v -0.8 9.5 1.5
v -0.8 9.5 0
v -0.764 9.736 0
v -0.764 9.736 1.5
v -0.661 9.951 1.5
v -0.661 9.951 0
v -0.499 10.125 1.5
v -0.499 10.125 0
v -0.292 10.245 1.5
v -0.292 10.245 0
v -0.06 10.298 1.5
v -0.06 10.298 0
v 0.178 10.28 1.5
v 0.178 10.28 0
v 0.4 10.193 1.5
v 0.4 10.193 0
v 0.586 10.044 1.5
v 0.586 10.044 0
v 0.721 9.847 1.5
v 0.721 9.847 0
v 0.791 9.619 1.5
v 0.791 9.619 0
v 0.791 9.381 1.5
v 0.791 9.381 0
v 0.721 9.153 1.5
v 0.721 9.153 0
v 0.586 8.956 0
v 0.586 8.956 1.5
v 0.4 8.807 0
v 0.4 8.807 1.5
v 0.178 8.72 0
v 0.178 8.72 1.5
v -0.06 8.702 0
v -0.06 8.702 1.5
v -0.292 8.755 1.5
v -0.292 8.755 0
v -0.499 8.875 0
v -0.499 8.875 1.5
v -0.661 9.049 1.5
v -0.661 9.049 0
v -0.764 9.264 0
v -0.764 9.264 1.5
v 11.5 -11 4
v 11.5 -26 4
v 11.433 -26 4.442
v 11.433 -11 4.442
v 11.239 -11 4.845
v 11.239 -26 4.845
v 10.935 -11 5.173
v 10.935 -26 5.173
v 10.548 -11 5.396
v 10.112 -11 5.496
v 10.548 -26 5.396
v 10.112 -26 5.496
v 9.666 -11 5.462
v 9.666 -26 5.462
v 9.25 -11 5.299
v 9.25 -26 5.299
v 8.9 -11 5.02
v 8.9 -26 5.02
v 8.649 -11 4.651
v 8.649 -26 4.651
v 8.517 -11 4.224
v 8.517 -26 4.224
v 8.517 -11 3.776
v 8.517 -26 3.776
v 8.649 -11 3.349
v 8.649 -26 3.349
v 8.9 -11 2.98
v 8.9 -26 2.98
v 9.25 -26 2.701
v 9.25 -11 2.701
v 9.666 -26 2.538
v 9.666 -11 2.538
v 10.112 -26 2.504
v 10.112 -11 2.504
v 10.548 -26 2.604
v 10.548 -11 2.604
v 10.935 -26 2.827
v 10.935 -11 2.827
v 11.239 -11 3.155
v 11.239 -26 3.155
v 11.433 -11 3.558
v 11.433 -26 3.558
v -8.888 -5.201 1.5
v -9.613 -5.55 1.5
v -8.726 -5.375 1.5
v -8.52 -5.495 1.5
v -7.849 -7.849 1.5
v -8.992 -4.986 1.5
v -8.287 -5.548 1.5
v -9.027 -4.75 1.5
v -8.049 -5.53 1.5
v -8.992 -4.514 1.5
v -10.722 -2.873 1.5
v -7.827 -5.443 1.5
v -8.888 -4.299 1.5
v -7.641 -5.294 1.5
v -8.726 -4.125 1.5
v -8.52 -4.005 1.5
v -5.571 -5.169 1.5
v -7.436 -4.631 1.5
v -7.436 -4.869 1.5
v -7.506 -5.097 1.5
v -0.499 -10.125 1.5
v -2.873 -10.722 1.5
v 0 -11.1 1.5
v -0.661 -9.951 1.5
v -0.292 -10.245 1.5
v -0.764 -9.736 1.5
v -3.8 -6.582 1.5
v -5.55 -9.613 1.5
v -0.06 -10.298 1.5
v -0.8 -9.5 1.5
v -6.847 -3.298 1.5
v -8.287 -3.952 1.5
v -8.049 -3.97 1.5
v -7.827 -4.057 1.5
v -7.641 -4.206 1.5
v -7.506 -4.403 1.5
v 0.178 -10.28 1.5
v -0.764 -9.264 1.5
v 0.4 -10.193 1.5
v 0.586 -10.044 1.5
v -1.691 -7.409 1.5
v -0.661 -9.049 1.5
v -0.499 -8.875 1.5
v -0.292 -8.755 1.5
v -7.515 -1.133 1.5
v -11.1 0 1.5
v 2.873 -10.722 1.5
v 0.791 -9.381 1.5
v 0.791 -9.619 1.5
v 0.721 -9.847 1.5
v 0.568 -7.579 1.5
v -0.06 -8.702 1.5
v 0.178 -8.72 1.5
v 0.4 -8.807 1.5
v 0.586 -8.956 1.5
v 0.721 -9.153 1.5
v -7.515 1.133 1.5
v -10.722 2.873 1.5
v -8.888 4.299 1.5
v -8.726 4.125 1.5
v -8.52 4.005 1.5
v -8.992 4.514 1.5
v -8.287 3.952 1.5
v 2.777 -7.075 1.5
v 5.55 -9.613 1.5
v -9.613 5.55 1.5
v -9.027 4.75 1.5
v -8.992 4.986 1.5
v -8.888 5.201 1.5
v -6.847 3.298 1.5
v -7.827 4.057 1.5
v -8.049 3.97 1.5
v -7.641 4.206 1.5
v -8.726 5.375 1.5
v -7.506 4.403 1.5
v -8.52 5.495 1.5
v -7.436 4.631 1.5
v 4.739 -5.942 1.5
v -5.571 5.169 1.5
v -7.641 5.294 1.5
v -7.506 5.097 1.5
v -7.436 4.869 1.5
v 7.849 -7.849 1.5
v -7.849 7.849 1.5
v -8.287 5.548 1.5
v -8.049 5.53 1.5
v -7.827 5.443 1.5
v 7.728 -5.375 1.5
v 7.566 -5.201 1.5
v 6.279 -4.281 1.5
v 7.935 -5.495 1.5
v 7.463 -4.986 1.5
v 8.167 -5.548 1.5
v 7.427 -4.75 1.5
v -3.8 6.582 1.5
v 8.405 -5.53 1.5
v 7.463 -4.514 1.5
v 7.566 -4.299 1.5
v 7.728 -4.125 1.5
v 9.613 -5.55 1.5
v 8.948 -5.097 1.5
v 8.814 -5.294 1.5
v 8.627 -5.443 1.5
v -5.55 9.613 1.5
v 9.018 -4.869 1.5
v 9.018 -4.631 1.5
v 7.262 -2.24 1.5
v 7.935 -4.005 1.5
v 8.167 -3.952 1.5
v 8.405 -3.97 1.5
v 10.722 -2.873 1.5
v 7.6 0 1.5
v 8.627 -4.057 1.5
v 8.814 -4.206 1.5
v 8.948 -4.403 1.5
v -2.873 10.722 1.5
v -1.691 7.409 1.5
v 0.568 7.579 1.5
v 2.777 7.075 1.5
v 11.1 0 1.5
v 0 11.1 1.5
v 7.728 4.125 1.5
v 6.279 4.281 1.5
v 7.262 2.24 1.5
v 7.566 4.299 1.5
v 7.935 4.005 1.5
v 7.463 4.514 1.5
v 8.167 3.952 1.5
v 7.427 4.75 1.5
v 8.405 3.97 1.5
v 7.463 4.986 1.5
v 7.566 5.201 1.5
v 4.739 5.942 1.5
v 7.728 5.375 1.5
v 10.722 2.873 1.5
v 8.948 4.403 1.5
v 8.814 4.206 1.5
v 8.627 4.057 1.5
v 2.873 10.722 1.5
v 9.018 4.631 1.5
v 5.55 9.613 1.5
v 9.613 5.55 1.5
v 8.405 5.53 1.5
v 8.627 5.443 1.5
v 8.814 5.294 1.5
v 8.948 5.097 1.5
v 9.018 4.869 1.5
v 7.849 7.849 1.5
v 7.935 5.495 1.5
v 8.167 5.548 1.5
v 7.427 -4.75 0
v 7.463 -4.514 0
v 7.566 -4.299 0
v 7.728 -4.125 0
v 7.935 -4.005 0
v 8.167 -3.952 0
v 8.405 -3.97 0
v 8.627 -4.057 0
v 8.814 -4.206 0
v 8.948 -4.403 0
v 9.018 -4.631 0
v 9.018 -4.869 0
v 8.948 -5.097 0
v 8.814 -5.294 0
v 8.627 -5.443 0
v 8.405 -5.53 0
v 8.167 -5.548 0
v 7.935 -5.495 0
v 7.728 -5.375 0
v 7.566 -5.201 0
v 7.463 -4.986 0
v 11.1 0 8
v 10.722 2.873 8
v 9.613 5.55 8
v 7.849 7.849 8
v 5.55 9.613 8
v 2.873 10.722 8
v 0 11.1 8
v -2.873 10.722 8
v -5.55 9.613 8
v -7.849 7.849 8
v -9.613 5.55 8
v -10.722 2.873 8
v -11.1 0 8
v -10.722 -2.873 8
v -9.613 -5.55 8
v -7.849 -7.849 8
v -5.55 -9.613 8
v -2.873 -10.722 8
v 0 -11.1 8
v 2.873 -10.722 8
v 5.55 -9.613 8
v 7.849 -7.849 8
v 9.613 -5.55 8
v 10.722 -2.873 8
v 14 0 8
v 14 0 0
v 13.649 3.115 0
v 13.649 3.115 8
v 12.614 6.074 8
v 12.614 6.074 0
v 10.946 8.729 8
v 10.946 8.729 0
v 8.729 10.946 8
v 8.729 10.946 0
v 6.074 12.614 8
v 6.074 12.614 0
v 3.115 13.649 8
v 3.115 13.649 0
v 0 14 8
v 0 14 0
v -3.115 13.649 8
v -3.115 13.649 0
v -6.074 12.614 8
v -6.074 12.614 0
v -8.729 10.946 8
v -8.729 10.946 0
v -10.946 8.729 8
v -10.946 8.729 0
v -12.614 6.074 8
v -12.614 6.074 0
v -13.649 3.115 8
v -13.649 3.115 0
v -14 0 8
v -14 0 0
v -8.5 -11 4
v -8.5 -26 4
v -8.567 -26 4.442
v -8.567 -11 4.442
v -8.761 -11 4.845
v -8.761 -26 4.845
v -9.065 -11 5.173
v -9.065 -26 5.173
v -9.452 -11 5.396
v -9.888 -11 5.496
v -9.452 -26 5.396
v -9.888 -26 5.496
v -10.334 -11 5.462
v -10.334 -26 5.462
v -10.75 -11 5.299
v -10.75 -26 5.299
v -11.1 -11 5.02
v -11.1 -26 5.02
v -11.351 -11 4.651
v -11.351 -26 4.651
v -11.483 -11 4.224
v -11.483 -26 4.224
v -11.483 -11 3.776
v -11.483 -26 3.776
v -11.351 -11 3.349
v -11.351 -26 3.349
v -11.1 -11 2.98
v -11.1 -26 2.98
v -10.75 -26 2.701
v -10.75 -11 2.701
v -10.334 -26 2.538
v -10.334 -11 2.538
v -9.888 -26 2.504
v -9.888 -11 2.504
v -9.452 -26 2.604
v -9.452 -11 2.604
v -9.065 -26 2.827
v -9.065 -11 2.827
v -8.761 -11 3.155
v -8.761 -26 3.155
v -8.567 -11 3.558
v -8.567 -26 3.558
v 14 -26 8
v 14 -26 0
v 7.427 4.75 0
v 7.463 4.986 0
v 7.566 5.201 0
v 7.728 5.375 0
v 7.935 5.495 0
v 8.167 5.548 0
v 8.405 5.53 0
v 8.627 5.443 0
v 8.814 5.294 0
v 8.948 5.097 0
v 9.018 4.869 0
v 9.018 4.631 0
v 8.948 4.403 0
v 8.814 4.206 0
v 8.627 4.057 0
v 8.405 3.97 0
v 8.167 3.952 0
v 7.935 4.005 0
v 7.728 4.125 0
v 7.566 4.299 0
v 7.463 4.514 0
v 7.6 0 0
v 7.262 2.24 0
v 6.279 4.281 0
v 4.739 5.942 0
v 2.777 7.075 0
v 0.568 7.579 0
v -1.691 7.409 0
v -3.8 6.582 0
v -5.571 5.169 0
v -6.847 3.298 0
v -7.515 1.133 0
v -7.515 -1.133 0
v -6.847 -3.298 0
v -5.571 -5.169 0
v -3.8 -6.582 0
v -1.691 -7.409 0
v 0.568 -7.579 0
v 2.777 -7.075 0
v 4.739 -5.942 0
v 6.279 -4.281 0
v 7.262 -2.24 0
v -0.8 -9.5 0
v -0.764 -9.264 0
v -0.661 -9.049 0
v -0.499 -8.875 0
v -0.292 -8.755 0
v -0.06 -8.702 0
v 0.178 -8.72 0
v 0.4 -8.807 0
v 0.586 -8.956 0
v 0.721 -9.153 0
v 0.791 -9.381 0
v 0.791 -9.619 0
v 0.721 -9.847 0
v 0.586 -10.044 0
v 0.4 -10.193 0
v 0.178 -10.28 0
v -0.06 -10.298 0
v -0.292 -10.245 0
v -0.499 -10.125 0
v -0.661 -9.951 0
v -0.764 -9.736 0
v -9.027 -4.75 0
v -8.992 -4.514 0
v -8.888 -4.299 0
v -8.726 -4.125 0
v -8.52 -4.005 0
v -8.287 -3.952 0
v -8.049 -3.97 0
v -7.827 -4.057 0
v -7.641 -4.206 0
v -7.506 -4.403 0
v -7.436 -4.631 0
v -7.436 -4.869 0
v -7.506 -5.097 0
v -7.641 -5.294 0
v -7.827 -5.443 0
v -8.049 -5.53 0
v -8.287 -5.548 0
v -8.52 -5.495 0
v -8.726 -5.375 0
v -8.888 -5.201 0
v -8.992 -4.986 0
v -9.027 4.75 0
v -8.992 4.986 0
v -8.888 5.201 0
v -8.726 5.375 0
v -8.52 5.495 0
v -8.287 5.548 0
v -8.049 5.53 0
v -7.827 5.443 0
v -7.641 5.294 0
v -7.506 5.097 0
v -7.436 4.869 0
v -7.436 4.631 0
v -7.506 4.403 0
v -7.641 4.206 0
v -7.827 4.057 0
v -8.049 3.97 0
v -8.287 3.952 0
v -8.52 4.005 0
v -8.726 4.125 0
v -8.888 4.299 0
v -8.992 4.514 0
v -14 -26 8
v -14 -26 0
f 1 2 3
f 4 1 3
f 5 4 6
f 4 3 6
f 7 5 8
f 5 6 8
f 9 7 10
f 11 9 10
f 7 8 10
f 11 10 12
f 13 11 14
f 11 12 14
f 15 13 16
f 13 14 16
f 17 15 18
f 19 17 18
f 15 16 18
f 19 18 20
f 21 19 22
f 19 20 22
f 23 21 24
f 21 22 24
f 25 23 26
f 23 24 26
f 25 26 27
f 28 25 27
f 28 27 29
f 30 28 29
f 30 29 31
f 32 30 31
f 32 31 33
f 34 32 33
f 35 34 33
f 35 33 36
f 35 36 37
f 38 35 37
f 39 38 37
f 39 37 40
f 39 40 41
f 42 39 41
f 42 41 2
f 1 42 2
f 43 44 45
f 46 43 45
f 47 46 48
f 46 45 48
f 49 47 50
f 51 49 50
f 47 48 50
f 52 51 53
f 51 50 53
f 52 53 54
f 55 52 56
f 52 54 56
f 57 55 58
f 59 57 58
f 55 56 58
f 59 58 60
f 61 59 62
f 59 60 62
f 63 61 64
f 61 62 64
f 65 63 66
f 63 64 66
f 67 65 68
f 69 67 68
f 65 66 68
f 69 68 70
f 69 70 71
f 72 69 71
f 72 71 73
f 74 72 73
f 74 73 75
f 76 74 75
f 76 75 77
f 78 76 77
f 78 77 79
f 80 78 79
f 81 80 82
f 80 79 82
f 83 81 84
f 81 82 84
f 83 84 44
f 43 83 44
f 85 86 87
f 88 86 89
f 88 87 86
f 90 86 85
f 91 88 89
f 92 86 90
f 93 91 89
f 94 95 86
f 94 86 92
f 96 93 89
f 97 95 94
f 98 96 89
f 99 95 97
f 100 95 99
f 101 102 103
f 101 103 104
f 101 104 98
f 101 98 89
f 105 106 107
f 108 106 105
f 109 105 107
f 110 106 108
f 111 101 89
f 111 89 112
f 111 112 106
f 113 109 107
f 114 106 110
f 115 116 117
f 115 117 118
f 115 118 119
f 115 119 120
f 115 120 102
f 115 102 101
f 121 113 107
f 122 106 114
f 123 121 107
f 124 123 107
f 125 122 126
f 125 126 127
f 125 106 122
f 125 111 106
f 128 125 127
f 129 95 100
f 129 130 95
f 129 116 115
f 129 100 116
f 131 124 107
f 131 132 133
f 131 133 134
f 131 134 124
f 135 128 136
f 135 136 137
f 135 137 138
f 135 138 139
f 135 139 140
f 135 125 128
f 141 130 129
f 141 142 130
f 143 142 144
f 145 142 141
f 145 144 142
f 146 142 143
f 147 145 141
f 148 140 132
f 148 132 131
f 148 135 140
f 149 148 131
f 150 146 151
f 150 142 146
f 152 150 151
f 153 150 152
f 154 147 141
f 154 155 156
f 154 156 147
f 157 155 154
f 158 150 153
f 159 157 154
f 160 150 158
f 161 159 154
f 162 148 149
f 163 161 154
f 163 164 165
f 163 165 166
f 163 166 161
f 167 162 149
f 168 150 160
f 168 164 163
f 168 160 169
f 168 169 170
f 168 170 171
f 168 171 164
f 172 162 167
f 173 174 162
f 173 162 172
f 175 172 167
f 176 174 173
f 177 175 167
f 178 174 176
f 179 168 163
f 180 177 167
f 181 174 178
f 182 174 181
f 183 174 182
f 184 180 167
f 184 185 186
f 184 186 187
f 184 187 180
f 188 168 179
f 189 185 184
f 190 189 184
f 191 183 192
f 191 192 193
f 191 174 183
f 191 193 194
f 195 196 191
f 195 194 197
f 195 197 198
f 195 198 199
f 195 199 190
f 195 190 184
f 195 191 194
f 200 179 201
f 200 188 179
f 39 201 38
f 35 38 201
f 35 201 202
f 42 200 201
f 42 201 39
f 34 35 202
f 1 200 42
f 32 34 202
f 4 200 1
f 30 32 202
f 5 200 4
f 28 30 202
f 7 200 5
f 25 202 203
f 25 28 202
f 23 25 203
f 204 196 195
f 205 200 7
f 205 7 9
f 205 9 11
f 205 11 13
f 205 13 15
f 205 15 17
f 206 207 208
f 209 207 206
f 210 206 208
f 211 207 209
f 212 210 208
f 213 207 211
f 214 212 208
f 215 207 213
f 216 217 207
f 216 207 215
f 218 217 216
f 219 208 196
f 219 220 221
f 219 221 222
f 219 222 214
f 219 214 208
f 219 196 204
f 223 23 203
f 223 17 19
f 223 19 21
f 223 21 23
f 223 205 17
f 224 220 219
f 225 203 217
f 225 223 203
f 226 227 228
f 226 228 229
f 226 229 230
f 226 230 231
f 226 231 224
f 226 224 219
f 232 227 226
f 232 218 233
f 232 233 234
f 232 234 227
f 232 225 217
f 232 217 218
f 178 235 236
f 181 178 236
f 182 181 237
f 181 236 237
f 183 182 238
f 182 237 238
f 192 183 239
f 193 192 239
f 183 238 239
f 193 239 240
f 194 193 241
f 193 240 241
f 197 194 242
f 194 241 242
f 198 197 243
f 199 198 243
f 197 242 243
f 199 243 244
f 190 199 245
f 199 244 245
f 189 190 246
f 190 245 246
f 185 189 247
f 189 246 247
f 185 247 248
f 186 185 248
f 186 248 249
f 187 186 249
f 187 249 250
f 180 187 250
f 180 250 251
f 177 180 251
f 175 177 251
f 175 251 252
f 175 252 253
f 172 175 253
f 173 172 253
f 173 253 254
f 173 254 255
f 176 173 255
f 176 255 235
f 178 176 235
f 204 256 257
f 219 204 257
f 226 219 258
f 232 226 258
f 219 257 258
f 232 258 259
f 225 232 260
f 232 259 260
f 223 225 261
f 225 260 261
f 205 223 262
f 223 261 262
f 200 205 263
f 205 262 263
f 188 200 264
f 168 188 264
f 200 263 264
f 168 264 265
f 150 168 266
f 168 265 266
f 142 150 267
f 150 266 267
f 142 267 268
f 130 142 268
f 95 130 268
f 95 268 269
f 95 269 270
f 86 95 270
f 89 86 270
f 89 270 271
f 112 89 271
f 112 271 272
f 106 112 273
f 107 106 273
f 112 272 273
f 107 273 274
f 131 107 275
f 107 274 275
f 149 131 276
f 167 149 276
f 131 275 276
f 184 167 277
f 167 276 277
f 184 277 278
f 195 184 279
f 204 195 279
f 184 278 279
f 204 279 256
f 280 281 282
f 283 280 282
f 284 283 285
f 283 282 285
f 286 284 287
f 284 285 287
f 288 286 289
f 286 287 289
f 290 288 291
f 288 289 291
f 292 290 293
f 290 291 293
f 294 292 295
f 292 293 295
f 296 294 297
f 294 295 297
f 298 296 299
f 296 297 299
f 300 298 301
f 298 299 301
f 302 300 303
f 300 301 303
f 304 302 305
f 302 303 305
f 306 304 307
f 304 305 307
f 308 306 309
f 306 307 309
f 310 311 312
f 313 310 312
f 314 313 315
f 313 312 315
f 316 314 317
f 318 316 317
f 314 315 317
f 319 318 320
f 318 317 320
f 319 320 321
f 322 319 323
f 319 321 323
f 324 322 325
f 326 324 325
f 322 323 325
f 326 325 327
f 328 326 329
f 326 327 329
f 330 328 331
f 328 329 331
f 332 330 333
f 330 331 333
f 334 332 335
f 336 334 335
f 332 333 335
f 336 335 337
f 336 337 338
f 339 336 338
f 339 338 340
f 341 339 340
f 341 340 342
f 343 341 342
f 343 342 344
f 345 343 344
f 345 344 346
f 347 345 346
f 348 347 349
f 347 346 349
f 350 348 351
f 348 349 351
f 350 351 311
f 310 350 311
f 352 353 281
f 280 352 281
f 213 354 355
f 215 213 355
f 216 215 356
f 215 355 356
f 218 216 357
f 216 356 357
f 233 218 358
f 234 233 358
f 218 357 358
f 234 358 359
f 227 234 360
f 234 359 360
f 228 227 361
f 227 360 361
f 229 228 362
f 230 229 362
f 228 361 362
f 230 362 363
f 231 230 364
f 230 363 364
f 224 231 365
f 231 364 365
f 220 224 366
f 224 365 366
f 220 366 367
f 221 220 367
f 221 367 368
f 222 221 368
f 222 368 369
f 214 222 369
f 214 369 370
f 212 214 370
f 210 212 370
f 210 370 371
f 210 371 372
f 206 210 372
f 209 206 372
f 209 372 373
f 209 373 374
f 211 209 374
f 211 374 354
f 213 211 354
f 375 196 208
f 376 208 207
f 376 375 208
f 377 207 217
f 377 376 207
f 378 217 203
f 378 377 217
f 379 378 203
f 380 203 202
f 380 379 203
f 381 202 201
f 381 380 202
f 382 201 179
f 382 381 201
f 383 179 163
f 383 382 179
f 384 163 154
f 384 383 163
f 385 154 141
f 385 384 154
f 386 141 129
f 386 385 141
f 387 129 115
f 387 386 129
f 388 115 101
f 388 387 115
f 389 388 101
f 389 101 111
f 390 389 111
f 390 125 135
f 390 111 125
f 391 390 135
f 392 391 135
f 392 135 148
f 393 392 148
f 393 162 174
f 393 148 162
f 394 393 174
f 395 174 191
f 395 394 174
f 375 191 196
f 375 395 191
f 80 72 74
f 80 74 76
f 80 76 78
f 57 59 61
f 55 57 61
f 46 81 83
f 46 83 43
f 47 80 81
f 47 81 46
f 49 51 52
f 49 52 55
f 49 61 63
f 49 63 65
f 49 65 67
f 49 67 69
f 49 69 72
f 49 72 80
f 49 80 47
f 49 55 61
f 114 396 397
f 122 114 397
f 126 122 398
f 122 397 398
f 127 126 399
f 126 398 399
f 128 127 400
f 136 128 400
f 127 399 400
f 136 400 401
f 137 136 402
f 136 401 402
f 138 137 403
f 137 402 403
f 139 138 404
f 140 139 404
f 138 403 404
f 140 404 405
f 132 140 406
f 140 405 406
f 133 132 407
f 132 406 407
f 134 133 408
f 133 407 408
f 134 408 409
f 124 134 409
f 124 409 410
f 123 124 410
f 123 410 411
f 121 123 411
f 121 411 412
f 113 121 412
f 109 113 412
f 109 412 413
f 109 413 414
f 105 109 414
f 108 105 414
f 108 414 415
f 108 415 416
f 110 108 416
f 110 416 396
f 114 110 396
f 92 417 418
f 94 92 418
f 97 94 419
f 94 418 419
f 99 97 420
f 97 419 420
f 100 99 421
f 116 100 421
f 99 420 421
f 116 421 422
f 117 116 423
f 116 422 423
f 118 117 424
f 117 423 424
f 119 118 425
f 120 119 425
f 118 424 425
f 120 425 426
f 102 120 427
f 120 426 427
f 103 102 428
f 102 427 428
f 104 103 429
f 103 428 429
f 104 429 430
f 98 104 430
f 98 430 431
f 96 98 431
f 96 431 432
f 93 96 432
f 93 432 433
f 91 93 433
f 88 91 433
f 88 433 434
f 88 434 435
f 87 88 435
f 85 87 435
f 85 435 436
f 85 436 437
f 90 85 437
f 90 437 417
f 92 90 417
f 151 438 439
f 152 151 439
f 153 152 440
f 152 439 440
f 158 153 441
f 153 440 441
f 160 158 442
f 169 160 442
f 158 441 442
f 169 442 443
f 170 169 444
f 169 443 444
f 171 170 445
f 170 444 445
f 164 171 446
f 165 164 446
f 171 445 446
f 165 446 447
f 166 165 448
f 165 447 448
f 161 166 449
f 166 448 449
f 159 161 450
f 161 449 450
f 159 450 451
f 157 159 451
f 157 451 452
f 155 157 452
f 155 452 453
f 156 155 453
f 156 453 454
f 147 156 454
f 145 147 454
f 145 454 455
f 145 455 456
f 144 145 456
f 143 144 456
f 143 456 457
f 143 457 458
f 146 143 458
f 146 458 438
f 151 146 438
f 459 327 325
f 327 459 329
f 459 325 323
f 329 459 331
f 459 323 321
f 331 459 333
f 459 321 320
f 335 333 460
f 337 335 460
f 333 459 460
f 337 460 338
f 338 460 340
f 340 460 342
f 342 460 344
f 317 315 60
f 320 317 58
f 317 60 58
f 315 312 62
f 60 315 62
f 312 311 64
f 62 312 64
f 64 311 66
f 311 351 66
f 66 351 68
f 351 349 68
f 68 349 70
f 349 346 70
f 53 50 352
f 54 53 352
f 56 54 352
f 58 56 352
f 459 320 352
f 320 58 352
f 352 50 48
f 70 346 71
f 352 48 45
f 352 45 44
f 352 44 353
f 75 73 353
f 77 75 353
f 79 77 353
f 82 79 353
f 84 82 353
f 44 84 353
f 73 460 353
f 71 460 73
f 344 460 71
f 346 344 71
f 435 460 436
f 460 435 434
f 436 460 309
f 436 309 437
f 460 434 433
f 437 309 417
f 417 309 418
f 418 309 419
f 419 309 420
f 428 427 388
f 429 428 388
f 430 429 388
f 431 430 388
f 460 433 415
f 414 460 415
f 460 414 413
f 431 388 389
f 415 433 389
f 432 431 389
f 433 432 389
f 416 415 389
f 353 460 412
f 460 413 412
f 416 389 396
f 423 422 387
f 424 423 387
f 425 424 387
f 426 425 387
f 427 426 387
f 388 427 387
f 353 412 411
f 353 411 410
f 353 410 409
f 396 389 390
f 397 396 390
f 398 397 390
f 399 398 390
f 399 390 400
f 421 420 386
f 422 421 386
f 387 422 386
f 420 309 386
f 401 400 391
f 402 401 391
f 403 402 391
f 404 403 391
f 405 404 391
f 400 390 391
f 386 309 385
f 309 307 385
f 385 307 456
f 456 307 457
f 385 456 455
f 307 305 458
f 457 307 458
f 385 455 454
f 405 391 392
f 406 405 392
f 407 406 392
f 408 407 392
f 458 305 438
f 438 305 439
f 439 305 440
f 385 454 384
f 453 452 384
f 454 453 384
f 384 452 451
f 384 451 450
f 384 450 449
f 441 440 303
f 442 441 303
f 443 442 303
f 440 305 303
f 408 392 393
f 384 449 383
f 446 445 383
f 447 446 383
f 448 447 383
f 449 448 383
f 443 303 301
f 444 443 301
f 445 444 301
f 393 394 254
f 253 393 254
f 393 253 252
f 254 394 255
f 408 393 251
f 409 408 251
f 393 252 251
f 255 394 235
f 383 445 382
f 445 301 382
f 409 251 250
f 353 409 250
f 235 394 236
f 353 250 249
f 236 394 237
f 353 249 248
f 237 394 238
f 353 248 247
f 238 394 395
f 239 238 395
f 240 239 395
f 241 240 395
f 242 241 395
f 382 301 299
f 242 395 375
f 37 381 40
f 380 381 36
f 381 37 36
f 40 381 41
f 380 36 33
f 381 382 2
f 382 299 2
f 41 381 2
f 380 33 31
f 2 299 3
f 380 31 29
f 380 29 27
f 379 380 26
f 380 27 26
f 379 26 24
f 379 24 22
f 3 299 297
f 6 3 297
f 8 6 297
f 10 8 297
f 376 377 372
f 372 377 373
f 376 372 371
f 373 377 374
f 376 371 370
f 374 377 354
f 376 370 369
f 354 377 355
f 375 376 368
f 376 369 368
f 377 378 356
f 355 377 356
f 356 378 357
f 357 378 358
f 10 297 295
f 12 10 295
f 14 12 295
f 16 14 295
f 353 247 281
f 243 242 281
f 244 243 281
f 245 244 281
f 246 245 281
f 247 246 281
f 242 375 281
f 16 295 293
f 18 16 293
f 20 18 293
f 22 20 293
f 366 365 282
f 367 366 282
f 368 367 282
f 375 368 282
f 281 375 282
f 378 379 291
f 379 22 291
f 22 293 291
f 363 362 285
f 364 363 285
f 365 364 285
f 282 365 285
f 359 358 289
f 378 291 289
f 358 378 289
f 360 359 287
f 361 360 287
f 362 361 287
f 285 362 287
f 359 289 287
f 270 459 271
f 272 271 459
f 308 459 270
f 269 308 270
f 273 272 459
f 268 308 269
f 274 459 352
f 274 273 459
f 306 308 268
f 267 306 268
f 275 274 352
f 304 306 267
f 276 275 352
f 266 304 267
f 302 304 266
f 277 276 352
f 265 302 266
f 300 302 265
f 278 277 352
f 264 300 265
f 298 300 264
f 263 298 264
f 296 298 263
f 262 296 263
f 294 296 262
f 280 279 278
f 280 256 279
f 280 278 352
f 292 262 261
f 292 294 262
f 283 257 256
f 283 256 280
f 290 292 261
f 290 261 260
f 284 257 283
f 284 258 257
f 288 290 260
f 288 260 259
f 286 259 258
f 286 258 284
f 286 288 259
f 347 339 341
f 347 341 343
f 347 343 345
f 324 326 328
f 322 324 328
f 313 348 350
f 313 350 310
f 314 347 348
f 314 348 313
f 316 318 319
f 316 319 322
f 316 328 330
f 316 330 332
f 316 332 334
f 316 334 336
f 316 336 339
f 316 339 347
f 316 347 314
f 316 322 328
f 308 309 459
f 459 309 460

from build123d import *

# Parameters (mm, degrees)
ESQUISSE1_R             = 7.6
BOSS_EXTRU_1_DEPTH      = 8
ESQUISSE2_R             = 11.1
ENL_V_MAT_EXTRU_1_DEPTH = 6.5
ENL_V_MAT_EXTRU_2_REACH = 10
ESQUISSE3_R             = 0.8
ESQUISSE4_R             = 1.5
ENL_V_MAT_EXTRU_3_DEPTH = 15


with BuildPart() as part:
    # Esquisse1 → Boss.-Extru.1 (new body)
    with BuildSketch(Plane.XY):
        with BuildLine():
            Line((-14, 0), (-14, -26))
            Line((-14, -26), (14, -26))
            Line((14, -26), (14, 0))
            ThreePointArc((14, 0), (0, 14), (-14, 0))
        make_face()
        Circle(ESQUISSE1_R, mode=Mode.SUBTRACT)
    extrude(amount=BOSS_EXTRU_1_DEPTH)

    # Esquisse2 → Enlèv. mat.-Extru.1 (cut)
    with BuildSketch(Plane.XY.offset(8)):
        Circle(ESQUISSE2_R)
    extrude(amount=-ENL_V_MAT_EXTRU_1_DEPTH, mode=Mode.SUBTRACT)

    # Esquisse3 → Enlèv. mat.-Extru.2 (cut, up to next)
    with BuildSketch(Plane(origin=(0, 0, 0), x_dir=(-1, 0, 0), z_dir=(0, 0, -1)), mode=Mode.PRIVATE) as enl_v_mat_extru_2_sk1:
        with Locations((0, 9.5)):
            Circle(ESQUISSE3_R)
    enl_v_mat_extru_2_tool1 = extrude(enl_v_mat_extru_2_sk1.sketch, amount=-ENL_V_MAT_EXTRU_2_REACH, mode=Mode.PRIVATE) & part.part
    add(enl_v_mat_extru_2_tool1.solids().sort_by_distance((0, 9.5, 0))[0], mode=Mode.SUBTRACT)
    # Esquisse3 → Enlèv. mat.-Extru.2 (cut, up to next)
    with BuildSketch(Plane(origin=(0, 0, 0), x_dir=(-1, 0, 0), z_dir=(0, 0, -1)), mode=Mode.PRIVATE) as enl_v_mat_extru_2_sk2:
        with Locations((8.227241336, 4.75)):
            Circle(ESQUISSE3_R)
    enl_v_mat_extru_2_tool2 = extrude(enl_v_mat_extru_2_sk2.sketch, amount=-ENL_V_MAT_EXTRU_2_REACH, mode=Mode.PRIVATE) & part.part
    add(enl_v_mat_extru_2_tool2.solids().sort_by_distance((-8.227241, 4.75, 0))[0], mode=Mode.SUBTRACT)
    # Esquisse3 → Enlèv. mat.-Extru.2 (cut, up to next)
    with BuildSketch(Plane(origin=(0, 0, 0), x_dir=(-1, 0, 0), z_dir=(0, 0, -1)), mode=Mode.PRIVATE) as enl_v_mat_extru_2_sk3:
        with Locations((8.227241336, -4.75)):
            Circle(ESQUISSE3_R)
    enl_v_mat_extru_2_tool3 = extrude(enl_v_mat_extru_2_sk3.sketch, amount=-ENL_V_MAT_EXTRU_2_REACH, mode=Mode.PRIVATE) & part.part
    add(enl_v_mat_extru_2_tool3.solids().sort_by_distance((-8.227241, -4.75, 0))[0], mode=Mode.SUBTRACT)
    # Esquisse3 → Enlèv. mat.-Extru.2 (cut, up to next)
    with BuildSketch(Plane(origin=(0, 0, 0), x_dir=(-1, 0, 0), z_dir=(0, 0, -1)), mode=Mode.PRIVATE) as enl_v_mat_extru_2_sk4:
        with Locations((0, -9.5)):
            Circle(ESQUISSE3_R)
    enl_v_mat_extru_2_tool4 = extrude(enl_v_mat_extru_2_sk4.sketch, amount=-ENL_V_MAT_EXTRU_2_REACH, mode=Mode.PRIVATE) & part.part
    add(enl_v_mat_extru_2_tool4.solids().sort_by_distance((0, -9.5, 0))[0], mode=Mode.SUBTRACT)
    # Esquisse3 → Enlèv. mat.-Extru.2 (cut, up to next)
    with BuildSketch(Plane(origin=(0, 0, 0), x_dir=(-1, 0, 0), z_dir=(0, 0, -1)), mode=Mode.PRIVATE) as enl_v_mat_extru_2_sk5:
        with Locations((-8.227241336, -4.75)):
            Circle(ESQUISSE3_R)
    enl_v_mat_extru_2_tool5 = extrude(enl_v_mat_extru_2_sk5.sketch, amount=-ENL_V_MAT_EXTRU_2_REACH, mode=Mode.PRIVATE) & part.part
    add(enl_v_mat_extru_2_tool5.solids().sort_by_distance((8.227241, -4.75, 0))[0], mode=Mode.SUBTRACT)
    # Esquisse3 → Enlèv. mat.-Extru.2 (cut, up to next)
    with BuildSketch(Plane(origin=(0, 0, 0), x_dir=(-1, 0, 0), z_dir=(0, 0, -1)), mode=Mode.PRIVATE) as enl_v_mat_extru_2_sk6:
        with Locations((-8.227241336, 4.75)):
            Circle(ESQUISSE3_R)
    enl_v_mat_extru_2_tool6 = extrude(enl_v_mat_extru_2_sk6.sketch, amount=-ENL_V_MAT_EXTRU_2_REACH, mode=Mode.PRIVATE) & part.part
    add(enl_v_mat_extru_2_tool6.solids().sort_by_distance((8.227241, 4.75, 0))[0], mode=Mode.SUBTRACT)

    # Esquisse4 → Enlèv. mat.-Extru.3 (cut)
    with BuildSketch(Plane.XZ.offset(26)):
        with Locations((-10, 4)):
            Circle(ESQUISSE4_R)
        with Locations((10, 4)):
            Circle(ESQUISSE4_R)
    extrude(amount=-ENL_V_MAT_EXTRU_3_DEPTH, mode=Mode.SUBTRACT)


solid = part.part
